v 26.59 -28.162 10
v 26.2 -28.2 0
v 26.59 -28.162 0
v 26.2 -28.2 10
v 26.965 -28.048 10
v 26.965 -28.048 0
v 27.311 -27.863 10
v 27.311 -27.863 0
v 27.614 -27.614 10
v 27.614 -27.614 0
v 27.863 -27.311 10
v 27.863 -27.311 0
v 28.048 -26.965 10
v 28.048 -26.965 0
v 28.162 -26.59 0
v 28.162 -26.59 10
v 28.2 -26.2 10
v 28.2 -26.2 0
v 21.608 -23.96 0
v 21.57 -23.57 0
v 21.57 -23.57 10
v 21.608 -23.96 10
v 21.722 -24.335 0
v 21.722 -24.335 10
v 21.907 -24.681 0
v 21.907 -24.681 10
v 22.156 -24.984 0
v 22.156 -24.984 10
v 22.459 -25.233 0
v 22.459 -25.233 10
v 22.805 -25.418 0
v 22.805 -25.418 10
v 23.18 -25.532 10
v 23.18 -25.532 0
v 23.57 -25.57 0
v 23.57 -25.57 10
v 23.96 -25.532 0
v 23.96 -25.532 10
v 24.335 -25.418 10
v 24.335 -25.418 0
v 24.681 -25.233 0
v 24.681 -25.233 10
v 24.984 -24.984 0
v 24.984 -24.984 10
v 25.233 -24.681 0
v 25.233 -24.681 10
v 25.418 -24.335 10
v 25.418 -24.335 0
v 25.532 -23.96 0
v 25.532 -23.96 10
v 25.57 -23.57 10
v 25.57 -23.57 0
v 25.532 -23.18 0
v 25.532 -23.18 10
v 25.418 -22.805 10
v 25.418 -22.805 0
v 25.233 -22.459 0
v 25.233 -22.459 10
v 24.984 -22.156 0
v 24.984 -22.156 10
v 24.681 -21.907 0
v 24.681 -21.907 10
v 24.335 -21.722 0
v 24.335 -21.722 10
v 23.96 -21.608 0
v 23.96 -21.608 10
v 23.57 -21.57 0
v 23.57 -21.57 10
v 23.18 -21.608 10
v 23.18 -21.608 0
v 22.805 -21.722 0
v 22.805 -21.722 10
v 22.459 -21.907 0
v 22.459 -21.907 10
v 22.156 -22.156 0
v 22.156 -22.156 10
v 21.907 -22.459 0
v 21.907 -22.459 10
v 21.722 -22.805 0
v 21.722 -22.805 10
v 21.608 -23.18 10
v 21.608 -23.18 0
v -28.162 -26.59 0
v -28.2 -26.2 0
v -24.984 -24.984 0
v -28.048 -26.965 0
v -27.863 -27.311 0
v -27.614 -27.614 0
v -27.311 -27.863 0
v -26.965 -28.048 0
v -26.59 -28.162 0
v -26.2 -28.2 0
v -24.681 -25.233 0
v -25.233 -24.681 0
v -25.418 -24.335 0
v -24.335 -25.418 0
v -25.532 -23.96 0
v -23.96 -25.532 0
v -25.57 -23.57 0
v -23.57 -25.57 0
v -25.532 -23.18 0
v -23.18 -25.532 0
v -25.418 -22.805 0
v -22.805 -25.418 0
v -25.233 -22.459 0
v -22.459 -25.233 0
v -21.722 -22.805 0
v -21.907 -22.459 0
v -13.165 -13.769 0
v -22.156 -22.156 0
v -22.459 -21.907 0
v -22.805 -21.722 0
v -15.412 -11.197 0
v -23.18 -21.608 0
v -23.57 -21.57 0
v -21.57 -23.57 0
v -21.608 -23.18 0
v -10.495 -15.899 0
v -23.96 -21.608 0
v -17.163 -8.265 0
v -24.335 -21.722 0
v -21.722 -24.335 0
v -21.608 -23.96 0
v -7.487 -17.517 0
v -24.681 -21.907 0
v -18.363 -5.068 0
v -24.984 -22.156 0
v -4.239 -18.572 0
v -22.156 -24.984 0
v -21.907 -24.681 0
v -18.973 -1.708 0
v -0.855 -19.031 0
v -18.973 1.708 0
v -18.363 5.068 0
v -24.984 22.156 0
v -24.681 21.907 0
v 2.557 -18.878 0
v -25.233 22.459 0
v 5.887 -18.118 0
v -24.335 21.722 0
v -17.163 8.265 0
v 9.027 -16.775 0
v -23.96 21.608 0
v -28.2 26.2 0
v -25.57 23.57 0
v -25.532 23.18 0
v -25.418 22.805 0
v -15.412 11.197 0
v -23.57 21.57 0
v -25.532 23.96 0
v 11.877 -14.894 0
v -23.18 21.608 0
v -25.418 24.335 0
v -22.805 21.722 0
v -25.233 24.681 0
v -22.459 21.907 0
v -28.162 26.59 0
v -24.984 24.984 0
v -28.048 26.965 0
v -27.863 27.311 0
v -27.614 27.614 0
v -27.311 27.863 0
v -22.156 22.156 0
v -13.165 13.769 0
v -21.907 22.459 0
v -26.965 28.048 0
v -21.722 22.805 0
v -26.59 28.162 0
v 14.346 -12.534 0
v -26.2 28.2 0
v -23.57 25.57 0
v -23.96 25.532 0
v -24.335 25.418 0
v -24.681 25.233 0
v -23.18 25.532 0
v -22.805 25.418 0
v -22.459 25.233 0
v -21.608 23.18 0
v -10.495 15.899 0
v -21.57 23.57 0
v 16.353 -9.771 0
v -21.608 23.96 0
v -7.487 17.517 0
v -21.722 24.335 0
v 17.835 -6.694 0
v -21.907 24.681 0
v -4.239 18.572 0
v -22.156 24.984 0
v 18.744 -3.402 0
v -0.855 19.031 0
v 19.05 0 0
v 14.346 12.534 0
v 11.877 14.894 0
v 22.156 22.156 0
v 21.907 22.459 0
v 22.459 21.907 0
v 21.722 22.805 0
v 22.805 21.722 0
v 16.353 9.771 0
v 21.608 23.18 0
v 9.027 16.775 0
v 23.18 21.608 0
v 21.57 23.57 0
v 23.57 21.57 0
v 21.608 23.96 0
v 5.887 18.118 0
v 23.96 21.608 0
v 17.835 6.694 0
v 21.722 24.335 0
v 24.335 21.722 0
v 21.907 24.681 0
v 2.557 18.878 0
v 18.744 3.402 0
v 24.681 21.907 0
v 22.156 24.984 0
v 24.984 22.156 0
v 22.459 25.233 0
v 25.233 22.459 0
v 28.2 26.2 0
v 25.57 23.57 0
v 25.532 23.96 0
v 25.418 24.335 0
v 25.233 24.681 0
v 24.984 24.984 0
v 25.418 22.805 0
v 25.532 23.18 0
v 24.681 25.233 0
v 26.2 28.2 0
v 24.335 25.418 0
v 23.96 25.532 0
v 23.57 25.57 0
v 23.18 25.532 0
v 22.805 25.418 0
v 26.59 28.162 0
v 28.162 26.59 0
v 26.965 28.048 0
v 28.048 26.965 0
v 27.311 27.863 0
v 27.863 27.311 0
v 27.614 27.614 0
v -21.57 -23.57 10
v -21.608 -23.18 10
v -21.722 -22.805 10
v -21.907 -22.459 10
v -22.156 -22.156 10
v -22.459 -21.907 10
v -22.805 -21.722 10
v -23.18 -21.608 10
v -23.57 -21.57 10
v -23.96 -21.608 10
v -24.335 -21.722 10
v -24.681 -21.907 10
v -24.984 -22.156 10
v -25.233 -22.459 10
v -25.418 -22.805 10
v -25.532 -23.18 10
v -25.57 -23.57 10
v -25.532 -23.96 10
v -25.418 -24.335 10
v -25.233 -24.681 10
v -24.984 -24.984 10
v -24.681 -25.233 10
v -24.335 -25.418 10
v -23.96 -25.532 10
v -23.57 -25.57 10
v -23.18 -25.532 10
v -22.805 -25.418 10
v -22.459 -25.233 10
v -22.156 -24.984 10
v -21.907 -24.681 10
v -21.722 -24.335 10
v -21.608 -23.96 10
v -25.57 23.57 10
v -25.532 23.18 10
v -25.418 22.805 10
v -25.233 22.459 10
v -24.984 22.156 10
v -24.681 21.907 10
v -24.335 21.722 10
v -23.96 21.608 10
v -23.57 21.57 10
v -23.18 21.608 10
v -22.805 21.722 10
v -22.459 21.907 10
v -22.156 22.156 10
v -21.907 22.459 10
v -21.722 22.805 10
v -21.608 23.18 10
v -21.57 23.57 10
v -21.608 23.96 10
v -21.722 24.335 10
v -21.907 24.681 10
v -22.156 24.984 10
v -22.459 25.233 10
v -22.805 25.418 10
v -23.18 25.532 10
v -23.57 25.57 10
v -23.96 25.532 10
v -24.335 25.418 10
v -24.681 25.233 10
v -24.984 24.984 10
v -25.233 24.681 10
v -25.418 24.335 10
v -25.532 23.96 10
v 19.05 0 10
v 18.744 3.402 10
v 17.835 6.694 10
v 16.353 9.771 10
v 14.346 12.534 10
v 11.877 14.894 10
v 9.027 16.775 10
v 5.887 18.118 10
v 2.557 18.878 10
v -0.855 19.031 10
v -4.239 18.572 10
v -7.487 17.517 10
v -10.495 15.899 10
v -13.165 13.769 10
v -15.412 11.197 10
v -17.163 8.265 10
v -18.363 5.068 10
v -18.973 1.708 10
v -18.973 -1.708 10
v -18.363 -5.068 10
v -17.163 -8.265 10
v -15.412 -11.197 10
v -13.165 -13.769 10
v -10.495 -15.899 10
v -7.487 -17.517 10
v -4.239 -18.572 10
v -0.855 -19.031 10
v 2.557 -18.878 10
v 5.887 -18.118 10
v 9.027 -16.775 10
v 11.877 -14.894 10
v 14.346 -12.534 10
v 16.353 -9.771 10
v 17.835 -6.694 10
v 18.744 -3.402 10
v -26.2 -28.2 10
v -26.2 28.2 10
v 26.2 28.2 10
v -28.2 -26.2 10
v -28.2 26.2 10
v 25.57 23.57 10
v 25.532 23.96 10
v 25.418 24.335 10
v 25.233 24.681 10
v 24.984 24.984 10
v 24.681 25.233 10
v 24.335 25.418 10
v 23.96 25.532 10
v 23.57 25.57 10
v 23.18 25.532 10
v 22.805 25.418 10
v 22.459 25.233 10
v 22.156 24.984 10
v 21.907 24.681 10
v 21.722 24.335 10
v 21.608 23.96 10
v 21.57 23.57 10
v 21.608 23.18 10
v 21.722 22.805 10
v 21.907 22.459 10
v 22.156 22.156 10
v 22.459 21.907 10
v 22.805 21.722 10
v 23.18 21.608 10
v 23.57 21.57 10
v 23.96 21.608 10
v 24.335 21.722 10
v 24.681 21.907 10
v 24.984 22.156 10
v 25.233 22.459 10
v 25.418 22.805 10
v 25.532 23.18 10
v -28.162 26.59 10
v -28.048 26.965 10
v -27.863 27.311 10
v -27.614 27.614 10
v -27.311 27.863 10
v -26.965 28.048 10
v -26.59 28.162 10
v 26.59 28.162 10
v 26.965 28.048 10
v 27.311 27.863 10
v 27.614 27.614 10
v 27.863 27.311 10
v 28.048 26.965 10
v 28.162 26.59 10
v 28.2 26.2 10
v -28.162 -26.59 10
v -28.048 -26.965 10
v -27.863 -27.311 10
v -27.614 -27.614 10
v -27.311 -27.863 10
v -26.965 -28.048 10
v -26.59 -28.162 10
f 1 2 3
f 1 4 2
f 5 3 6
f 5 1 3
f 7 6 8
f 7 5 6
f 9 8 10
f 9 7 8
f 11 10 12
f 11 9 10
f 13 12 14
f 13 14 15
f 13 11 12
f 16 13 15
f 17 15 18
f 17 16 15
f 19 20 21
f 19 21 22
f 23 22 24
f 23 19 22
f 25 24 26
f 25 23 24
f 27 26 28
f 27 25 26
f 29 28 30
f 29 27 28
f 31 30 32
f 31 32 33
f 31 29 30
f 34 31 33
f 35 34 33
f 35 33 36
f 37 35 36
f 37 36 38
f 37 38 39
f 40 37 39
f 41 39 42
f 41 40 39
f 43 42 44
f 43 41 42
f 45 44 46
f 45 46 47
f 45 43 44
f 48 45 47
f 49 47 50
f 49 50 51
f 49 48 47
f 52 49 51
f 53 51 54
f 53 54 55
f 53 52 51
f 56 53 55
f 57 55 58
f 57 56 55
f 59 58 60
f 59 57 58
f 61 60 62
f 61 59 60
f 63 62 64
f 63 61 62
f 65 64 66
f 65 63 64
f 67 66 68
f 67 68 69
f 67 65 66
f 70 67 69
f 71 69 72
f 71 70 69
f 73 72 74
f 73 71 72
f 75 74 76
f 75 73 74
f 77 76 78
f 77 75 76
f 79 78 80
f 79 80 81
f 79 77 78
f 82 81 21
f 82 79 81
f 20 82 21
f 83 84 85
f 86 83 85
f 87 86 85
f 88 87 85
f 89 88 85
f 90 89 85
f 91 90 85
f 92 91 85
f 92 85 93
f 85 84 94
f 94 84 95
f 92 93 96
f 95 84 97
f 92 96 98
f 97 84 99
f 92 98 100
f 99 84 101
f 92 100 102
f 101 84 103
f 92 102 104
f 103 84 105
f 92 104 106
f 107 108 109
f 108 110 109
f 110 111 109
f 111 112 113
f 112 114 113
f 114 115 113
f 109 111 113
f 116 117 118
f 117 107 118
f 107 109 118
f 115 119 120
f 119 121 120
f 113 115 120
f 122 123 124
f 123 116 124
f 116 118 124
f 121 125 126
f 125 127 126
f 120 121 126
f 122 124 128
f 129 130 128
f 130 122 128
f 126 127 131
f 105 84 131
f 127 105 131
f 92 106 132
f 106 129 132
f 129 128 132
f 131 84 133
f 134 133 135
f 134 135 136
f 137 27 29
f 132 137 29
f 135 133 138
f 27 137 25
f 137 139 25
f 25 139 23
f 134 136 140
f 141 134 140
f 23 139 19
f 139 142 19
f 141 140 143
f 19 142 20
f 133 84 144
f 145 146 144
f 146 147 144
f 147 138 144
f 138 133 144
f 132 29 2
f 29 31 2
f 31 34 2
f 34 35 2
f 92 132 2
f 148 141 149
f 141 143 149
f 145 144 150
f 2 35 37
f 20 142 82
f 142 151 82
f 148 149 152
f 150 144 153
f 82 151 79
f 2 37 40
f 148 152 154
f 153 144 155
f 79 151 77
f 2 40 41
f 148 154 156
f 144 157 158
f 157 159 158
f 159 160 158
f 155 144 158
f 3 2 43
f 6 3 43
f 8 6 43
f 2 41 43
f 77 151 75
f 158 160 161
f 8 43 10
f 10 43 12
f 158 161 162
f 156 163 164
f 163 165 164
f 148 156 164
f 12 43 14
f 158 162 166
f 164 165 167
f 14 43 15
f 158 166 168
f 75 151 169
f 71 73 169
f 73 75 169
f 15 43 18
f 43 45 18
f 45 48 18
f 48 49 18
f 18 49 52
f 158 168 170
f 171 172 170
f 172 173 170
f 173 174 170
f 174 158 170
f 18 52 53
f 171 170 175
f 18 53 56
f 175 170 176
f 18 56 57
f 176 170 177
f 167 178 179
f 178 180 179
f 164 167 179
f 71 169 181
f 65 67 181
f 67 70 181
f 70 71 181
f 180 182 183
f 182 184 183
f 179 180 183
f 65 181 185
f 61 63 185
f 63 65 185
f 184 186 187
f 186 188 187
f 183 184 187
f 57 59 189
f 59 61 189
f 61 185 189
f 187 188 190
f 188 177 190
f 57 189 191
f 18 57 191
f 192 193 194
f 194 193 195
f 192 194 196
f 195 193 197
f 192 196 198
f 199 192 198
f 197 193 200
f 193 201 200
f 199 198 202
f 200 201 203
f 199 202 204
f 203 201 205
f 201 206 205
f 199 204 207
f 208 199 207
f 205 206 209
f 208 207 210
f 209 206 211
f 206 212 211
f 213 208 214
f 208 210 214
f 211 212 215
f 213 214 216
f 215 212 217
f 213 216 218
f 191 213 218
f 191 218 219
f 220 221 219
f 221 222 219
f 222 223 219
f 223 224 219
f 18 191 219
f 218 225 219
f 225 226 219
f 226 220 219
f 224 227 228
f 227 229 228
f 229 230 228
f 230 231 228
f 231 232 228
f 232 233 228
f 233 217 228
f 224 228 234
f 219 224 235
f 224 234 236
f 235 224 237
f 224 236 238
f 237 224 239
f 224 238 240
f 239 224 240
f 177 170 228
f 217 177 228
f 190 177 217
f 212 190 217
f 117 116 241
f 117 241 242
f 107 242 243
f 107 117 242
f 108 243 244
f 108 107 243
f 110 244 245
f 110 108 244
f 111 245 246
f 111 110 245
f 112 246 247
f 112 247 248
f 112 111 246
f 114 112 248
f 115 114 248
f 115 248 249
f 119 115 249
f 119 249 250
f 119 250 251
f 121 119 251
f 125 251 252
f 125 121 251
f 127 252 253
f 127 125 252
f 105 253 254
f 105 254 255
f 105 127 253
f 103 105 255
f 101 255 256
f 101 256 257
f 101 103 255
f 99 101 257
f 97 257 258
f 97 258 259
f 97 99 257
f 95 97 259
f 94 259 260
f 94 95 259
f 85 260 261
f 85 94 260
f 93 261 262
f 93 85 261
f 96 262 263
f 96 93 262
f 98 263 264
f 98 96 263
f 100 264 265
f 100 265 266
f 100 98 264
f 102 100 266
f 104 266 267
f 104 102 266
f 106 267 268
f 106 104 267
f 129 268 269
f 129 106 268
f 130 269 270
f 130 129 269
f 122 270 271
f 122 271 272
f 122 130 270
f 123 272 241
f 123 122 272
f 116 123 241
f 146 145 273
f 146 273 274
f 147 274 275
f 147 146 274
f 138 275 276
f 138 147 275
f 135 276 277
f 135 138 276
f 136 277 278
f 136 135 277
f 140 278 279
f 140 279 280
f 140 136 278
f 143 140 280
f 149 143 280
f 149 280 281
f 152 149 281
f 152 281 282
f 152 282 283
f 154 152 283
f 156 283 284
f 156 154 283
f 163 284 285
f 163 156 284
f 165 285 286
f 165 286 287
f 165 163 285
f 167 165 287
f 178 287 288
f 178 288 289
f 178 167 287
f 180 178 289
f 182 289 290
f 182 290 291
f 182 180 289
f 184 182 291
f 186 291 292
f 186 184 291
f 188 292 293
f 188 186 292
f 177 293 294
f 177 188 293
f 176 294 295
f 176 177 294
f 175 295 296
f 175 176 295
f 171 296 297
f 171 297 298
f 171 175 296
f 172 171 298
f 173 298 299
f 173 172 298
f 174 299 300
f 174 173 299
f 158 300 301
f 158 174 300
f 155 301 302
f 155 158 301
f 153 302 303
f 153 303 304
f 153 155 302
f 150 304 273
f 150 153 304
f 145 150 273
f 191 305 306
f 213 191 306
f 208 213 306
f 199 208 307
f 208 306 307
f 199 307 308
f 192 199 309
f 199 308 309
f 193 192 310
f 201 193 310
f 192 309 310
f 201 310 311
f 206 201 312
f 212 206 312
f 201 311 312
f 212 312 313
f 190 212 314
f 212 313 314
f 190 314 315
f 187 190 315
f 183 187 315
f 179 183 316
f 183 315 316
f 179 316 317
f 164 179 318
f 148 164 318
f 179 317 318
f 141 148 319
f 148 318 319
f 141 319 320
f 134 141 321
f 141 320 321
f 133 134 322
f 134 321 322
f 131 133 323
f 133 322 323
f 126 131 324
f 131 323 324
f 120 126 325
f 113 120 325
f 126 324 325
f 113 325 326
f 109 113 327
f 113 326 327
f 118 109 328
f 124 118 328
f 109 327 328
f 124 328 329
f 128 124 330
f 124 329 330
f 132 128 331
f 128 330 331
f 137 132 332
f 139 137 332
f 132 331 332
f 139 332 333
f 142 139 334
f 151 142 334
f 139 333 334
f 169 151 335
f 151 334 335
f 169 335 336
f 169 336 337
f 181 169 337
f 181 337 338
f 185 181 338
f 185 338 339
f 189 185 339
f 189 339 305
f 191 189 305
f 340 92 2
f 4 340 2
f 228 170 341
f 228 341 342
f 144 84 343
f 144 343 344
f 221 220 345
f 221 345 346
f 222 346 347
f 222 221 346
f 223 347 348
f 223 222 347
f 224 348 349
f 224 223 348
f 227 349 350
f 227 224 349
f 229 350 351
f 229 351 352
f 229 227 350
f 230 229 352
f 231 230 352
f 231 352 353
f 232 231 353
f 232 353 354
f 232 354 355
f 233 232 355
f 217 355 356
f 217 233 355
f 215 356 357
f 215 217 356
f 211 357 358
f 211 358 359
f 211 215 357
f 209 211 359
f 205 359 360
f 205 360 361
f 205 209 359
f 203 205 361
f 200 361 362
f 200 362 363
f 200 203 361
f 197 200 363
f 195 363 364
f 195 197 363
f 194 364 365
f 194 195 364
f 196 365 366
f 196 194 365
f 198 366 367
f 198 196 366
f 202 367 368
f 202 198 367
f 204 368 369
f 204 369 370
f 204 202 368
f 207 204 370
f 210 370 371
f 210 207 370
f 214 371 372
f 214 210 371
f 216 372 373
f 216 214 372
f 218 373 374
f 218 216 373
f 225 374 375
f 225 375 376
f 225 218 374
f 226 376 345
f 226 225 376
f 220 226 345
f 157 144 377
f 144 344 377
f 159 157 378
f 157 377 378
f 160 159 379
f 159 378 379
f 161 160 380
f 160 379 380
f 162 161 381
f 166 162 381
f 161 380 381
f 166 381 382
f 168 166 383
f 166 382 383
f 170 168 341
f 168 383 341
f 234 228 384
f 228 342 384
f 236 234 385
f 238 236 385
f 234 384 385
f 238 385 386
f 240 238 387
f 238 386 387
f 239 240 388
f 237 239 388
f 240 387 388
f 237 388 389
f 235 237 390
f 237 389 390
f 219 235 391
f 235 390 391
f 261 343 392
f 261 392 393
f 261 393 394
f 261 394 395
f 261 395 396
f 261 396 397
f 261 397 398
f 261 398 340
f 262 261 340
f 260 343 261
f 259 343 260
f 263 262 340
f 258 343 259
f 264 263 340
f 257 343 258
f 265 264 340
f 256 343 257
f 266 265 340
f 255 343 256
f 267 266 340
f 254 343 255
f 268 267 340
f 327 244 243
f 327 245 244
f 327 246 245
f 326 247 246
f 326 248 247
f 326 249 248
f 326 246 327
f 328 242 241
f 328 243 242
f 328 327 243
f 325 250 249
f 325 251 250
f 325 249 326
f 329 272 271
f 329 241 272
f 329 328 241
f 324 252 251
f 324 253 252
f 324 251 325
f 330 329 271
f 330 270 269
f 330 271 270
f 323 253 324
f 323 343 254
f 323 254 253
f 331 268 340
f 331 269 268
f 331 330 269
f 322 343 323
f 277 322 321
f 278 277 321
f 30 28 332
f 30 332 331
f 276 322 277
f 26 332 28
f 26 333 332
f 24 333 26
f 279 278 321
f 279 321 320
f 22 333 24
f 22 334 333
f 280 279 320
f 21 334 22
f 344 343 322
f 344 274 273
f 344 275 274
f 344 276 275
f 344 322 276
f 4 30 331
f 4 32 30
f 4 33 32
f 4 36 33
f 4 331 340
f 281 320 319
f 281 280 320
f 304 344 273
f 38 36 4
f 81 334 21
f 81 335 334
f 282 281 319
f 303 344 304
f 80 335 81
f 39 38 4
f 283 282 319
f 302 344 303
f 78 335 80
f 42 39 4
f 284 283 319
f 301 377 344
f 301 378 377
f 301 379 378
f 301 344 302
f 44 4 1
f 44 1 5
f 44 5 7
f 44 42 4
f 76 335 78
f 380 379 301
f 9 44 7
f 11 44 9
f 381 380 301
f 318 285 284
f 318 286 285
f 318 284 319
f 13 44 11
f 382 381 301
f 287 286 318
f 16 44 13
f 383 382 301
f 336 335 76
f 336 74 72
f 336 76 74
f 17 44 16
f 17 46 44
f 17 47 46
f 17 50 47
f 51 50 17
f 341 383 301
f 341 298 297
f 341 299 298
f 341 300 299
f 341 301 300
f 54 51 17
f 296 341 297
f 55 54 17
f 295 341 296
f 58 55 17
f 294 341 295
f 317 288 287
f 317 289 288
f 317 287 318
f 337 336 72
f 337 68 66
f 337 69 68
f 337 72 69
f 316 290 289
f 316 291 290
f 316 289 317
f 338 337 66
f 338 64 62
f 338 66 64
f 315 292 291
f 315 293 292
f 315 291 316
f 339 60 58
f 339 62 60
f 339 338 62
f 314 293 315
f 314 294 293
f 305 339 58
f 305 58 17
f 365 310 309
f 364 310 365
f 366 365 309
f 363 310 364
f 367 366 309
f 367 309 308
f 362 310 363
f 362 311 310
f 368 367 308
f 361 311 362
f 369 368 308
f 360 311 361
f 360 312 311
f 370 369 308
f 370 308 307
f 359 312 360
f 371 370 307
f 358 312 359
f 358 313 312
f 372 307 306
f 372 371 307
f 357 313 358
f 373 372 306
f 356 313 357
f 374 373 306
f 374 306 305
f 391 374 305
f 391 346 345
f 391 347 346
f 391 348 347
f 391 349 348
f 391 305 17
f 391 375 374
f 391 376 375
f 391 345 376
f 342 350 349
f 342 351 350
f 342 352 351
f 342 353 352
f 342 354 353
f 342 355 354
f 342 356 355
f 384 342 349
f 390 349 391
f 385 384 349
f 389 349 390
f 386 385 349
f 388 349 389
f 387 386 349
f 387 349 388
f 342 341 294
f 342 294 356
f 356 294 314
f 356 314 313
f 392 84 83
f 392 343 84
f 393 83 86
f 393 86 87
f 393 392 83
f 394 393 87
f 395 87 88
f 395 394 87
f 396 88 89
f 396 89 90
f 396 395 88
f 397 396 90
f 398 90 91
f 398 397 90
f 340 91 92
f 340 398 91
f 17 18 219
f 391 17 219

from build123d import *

# Parameters (mm, degrees)
ESQUISSE1_W             = 56.4
ESQUISSE1_H             = 56.4
ESQUISSE1_R             = 2
BOSS_EXTRU_1_DEPTH      = 10
ESQUISSE2_R             = 19.05
ENL_V_MAT_EXTRU_1_DEPTH = 10
CONG_1_R                = 2


with BuildPart() as part:
    # Esquisse1 → Boss.-Extru.1 (new body)
    with BuildSketch(Plane.XY):
        Rectangle(ESQUISSE1_W, ESQUISSE1_H)
        with Locations((23.57, 23.57)):
            Circle(ESQUISSE1_R, mode=Mode.SUBTRACT)
        with Locations(Location((-23.57, 23.57, 0), (0, 0, 180))):
            Circle(ESQUISSE1_R, mode=Mode.SUBTRACT)
        with Locations(Location((23.57, -23.57, 0), (0, 0, 180))):
            Circle(ESQUISSE1_R, mode=Mode.SUBTRACT)
        with Locations((-23.57, -23.57)):
            Circle(ESQUISSE1_R, mode=Mode.SUBTRACT)
    extrude(amount=BOSS_EXTRU_1_DEPTH)

    # Esquisse2 → Enlèv. mat.-Extru.1 (cut)
    with BuildSketch(Plane.XY.offset(10)):
        Circle(ESQUISSE2_R)
    extrude(amount=-ENL_V_MAT_EXTRU_1_DEPTH, mode=Mode.SUBTRACT)

    # Congé1
    cong_1_edges = [part.edges().sort_by_distance(p)[0] for p in [
        (28.2, -28.2, 5),
        (-28.2, -28.2, 5),
        (-28.2, 28.2, 5),
        (28.2, 28.2, 5),
    ]]
    fillet(cong_1_edges, radius=CONG_1_R)


solid = part.part
